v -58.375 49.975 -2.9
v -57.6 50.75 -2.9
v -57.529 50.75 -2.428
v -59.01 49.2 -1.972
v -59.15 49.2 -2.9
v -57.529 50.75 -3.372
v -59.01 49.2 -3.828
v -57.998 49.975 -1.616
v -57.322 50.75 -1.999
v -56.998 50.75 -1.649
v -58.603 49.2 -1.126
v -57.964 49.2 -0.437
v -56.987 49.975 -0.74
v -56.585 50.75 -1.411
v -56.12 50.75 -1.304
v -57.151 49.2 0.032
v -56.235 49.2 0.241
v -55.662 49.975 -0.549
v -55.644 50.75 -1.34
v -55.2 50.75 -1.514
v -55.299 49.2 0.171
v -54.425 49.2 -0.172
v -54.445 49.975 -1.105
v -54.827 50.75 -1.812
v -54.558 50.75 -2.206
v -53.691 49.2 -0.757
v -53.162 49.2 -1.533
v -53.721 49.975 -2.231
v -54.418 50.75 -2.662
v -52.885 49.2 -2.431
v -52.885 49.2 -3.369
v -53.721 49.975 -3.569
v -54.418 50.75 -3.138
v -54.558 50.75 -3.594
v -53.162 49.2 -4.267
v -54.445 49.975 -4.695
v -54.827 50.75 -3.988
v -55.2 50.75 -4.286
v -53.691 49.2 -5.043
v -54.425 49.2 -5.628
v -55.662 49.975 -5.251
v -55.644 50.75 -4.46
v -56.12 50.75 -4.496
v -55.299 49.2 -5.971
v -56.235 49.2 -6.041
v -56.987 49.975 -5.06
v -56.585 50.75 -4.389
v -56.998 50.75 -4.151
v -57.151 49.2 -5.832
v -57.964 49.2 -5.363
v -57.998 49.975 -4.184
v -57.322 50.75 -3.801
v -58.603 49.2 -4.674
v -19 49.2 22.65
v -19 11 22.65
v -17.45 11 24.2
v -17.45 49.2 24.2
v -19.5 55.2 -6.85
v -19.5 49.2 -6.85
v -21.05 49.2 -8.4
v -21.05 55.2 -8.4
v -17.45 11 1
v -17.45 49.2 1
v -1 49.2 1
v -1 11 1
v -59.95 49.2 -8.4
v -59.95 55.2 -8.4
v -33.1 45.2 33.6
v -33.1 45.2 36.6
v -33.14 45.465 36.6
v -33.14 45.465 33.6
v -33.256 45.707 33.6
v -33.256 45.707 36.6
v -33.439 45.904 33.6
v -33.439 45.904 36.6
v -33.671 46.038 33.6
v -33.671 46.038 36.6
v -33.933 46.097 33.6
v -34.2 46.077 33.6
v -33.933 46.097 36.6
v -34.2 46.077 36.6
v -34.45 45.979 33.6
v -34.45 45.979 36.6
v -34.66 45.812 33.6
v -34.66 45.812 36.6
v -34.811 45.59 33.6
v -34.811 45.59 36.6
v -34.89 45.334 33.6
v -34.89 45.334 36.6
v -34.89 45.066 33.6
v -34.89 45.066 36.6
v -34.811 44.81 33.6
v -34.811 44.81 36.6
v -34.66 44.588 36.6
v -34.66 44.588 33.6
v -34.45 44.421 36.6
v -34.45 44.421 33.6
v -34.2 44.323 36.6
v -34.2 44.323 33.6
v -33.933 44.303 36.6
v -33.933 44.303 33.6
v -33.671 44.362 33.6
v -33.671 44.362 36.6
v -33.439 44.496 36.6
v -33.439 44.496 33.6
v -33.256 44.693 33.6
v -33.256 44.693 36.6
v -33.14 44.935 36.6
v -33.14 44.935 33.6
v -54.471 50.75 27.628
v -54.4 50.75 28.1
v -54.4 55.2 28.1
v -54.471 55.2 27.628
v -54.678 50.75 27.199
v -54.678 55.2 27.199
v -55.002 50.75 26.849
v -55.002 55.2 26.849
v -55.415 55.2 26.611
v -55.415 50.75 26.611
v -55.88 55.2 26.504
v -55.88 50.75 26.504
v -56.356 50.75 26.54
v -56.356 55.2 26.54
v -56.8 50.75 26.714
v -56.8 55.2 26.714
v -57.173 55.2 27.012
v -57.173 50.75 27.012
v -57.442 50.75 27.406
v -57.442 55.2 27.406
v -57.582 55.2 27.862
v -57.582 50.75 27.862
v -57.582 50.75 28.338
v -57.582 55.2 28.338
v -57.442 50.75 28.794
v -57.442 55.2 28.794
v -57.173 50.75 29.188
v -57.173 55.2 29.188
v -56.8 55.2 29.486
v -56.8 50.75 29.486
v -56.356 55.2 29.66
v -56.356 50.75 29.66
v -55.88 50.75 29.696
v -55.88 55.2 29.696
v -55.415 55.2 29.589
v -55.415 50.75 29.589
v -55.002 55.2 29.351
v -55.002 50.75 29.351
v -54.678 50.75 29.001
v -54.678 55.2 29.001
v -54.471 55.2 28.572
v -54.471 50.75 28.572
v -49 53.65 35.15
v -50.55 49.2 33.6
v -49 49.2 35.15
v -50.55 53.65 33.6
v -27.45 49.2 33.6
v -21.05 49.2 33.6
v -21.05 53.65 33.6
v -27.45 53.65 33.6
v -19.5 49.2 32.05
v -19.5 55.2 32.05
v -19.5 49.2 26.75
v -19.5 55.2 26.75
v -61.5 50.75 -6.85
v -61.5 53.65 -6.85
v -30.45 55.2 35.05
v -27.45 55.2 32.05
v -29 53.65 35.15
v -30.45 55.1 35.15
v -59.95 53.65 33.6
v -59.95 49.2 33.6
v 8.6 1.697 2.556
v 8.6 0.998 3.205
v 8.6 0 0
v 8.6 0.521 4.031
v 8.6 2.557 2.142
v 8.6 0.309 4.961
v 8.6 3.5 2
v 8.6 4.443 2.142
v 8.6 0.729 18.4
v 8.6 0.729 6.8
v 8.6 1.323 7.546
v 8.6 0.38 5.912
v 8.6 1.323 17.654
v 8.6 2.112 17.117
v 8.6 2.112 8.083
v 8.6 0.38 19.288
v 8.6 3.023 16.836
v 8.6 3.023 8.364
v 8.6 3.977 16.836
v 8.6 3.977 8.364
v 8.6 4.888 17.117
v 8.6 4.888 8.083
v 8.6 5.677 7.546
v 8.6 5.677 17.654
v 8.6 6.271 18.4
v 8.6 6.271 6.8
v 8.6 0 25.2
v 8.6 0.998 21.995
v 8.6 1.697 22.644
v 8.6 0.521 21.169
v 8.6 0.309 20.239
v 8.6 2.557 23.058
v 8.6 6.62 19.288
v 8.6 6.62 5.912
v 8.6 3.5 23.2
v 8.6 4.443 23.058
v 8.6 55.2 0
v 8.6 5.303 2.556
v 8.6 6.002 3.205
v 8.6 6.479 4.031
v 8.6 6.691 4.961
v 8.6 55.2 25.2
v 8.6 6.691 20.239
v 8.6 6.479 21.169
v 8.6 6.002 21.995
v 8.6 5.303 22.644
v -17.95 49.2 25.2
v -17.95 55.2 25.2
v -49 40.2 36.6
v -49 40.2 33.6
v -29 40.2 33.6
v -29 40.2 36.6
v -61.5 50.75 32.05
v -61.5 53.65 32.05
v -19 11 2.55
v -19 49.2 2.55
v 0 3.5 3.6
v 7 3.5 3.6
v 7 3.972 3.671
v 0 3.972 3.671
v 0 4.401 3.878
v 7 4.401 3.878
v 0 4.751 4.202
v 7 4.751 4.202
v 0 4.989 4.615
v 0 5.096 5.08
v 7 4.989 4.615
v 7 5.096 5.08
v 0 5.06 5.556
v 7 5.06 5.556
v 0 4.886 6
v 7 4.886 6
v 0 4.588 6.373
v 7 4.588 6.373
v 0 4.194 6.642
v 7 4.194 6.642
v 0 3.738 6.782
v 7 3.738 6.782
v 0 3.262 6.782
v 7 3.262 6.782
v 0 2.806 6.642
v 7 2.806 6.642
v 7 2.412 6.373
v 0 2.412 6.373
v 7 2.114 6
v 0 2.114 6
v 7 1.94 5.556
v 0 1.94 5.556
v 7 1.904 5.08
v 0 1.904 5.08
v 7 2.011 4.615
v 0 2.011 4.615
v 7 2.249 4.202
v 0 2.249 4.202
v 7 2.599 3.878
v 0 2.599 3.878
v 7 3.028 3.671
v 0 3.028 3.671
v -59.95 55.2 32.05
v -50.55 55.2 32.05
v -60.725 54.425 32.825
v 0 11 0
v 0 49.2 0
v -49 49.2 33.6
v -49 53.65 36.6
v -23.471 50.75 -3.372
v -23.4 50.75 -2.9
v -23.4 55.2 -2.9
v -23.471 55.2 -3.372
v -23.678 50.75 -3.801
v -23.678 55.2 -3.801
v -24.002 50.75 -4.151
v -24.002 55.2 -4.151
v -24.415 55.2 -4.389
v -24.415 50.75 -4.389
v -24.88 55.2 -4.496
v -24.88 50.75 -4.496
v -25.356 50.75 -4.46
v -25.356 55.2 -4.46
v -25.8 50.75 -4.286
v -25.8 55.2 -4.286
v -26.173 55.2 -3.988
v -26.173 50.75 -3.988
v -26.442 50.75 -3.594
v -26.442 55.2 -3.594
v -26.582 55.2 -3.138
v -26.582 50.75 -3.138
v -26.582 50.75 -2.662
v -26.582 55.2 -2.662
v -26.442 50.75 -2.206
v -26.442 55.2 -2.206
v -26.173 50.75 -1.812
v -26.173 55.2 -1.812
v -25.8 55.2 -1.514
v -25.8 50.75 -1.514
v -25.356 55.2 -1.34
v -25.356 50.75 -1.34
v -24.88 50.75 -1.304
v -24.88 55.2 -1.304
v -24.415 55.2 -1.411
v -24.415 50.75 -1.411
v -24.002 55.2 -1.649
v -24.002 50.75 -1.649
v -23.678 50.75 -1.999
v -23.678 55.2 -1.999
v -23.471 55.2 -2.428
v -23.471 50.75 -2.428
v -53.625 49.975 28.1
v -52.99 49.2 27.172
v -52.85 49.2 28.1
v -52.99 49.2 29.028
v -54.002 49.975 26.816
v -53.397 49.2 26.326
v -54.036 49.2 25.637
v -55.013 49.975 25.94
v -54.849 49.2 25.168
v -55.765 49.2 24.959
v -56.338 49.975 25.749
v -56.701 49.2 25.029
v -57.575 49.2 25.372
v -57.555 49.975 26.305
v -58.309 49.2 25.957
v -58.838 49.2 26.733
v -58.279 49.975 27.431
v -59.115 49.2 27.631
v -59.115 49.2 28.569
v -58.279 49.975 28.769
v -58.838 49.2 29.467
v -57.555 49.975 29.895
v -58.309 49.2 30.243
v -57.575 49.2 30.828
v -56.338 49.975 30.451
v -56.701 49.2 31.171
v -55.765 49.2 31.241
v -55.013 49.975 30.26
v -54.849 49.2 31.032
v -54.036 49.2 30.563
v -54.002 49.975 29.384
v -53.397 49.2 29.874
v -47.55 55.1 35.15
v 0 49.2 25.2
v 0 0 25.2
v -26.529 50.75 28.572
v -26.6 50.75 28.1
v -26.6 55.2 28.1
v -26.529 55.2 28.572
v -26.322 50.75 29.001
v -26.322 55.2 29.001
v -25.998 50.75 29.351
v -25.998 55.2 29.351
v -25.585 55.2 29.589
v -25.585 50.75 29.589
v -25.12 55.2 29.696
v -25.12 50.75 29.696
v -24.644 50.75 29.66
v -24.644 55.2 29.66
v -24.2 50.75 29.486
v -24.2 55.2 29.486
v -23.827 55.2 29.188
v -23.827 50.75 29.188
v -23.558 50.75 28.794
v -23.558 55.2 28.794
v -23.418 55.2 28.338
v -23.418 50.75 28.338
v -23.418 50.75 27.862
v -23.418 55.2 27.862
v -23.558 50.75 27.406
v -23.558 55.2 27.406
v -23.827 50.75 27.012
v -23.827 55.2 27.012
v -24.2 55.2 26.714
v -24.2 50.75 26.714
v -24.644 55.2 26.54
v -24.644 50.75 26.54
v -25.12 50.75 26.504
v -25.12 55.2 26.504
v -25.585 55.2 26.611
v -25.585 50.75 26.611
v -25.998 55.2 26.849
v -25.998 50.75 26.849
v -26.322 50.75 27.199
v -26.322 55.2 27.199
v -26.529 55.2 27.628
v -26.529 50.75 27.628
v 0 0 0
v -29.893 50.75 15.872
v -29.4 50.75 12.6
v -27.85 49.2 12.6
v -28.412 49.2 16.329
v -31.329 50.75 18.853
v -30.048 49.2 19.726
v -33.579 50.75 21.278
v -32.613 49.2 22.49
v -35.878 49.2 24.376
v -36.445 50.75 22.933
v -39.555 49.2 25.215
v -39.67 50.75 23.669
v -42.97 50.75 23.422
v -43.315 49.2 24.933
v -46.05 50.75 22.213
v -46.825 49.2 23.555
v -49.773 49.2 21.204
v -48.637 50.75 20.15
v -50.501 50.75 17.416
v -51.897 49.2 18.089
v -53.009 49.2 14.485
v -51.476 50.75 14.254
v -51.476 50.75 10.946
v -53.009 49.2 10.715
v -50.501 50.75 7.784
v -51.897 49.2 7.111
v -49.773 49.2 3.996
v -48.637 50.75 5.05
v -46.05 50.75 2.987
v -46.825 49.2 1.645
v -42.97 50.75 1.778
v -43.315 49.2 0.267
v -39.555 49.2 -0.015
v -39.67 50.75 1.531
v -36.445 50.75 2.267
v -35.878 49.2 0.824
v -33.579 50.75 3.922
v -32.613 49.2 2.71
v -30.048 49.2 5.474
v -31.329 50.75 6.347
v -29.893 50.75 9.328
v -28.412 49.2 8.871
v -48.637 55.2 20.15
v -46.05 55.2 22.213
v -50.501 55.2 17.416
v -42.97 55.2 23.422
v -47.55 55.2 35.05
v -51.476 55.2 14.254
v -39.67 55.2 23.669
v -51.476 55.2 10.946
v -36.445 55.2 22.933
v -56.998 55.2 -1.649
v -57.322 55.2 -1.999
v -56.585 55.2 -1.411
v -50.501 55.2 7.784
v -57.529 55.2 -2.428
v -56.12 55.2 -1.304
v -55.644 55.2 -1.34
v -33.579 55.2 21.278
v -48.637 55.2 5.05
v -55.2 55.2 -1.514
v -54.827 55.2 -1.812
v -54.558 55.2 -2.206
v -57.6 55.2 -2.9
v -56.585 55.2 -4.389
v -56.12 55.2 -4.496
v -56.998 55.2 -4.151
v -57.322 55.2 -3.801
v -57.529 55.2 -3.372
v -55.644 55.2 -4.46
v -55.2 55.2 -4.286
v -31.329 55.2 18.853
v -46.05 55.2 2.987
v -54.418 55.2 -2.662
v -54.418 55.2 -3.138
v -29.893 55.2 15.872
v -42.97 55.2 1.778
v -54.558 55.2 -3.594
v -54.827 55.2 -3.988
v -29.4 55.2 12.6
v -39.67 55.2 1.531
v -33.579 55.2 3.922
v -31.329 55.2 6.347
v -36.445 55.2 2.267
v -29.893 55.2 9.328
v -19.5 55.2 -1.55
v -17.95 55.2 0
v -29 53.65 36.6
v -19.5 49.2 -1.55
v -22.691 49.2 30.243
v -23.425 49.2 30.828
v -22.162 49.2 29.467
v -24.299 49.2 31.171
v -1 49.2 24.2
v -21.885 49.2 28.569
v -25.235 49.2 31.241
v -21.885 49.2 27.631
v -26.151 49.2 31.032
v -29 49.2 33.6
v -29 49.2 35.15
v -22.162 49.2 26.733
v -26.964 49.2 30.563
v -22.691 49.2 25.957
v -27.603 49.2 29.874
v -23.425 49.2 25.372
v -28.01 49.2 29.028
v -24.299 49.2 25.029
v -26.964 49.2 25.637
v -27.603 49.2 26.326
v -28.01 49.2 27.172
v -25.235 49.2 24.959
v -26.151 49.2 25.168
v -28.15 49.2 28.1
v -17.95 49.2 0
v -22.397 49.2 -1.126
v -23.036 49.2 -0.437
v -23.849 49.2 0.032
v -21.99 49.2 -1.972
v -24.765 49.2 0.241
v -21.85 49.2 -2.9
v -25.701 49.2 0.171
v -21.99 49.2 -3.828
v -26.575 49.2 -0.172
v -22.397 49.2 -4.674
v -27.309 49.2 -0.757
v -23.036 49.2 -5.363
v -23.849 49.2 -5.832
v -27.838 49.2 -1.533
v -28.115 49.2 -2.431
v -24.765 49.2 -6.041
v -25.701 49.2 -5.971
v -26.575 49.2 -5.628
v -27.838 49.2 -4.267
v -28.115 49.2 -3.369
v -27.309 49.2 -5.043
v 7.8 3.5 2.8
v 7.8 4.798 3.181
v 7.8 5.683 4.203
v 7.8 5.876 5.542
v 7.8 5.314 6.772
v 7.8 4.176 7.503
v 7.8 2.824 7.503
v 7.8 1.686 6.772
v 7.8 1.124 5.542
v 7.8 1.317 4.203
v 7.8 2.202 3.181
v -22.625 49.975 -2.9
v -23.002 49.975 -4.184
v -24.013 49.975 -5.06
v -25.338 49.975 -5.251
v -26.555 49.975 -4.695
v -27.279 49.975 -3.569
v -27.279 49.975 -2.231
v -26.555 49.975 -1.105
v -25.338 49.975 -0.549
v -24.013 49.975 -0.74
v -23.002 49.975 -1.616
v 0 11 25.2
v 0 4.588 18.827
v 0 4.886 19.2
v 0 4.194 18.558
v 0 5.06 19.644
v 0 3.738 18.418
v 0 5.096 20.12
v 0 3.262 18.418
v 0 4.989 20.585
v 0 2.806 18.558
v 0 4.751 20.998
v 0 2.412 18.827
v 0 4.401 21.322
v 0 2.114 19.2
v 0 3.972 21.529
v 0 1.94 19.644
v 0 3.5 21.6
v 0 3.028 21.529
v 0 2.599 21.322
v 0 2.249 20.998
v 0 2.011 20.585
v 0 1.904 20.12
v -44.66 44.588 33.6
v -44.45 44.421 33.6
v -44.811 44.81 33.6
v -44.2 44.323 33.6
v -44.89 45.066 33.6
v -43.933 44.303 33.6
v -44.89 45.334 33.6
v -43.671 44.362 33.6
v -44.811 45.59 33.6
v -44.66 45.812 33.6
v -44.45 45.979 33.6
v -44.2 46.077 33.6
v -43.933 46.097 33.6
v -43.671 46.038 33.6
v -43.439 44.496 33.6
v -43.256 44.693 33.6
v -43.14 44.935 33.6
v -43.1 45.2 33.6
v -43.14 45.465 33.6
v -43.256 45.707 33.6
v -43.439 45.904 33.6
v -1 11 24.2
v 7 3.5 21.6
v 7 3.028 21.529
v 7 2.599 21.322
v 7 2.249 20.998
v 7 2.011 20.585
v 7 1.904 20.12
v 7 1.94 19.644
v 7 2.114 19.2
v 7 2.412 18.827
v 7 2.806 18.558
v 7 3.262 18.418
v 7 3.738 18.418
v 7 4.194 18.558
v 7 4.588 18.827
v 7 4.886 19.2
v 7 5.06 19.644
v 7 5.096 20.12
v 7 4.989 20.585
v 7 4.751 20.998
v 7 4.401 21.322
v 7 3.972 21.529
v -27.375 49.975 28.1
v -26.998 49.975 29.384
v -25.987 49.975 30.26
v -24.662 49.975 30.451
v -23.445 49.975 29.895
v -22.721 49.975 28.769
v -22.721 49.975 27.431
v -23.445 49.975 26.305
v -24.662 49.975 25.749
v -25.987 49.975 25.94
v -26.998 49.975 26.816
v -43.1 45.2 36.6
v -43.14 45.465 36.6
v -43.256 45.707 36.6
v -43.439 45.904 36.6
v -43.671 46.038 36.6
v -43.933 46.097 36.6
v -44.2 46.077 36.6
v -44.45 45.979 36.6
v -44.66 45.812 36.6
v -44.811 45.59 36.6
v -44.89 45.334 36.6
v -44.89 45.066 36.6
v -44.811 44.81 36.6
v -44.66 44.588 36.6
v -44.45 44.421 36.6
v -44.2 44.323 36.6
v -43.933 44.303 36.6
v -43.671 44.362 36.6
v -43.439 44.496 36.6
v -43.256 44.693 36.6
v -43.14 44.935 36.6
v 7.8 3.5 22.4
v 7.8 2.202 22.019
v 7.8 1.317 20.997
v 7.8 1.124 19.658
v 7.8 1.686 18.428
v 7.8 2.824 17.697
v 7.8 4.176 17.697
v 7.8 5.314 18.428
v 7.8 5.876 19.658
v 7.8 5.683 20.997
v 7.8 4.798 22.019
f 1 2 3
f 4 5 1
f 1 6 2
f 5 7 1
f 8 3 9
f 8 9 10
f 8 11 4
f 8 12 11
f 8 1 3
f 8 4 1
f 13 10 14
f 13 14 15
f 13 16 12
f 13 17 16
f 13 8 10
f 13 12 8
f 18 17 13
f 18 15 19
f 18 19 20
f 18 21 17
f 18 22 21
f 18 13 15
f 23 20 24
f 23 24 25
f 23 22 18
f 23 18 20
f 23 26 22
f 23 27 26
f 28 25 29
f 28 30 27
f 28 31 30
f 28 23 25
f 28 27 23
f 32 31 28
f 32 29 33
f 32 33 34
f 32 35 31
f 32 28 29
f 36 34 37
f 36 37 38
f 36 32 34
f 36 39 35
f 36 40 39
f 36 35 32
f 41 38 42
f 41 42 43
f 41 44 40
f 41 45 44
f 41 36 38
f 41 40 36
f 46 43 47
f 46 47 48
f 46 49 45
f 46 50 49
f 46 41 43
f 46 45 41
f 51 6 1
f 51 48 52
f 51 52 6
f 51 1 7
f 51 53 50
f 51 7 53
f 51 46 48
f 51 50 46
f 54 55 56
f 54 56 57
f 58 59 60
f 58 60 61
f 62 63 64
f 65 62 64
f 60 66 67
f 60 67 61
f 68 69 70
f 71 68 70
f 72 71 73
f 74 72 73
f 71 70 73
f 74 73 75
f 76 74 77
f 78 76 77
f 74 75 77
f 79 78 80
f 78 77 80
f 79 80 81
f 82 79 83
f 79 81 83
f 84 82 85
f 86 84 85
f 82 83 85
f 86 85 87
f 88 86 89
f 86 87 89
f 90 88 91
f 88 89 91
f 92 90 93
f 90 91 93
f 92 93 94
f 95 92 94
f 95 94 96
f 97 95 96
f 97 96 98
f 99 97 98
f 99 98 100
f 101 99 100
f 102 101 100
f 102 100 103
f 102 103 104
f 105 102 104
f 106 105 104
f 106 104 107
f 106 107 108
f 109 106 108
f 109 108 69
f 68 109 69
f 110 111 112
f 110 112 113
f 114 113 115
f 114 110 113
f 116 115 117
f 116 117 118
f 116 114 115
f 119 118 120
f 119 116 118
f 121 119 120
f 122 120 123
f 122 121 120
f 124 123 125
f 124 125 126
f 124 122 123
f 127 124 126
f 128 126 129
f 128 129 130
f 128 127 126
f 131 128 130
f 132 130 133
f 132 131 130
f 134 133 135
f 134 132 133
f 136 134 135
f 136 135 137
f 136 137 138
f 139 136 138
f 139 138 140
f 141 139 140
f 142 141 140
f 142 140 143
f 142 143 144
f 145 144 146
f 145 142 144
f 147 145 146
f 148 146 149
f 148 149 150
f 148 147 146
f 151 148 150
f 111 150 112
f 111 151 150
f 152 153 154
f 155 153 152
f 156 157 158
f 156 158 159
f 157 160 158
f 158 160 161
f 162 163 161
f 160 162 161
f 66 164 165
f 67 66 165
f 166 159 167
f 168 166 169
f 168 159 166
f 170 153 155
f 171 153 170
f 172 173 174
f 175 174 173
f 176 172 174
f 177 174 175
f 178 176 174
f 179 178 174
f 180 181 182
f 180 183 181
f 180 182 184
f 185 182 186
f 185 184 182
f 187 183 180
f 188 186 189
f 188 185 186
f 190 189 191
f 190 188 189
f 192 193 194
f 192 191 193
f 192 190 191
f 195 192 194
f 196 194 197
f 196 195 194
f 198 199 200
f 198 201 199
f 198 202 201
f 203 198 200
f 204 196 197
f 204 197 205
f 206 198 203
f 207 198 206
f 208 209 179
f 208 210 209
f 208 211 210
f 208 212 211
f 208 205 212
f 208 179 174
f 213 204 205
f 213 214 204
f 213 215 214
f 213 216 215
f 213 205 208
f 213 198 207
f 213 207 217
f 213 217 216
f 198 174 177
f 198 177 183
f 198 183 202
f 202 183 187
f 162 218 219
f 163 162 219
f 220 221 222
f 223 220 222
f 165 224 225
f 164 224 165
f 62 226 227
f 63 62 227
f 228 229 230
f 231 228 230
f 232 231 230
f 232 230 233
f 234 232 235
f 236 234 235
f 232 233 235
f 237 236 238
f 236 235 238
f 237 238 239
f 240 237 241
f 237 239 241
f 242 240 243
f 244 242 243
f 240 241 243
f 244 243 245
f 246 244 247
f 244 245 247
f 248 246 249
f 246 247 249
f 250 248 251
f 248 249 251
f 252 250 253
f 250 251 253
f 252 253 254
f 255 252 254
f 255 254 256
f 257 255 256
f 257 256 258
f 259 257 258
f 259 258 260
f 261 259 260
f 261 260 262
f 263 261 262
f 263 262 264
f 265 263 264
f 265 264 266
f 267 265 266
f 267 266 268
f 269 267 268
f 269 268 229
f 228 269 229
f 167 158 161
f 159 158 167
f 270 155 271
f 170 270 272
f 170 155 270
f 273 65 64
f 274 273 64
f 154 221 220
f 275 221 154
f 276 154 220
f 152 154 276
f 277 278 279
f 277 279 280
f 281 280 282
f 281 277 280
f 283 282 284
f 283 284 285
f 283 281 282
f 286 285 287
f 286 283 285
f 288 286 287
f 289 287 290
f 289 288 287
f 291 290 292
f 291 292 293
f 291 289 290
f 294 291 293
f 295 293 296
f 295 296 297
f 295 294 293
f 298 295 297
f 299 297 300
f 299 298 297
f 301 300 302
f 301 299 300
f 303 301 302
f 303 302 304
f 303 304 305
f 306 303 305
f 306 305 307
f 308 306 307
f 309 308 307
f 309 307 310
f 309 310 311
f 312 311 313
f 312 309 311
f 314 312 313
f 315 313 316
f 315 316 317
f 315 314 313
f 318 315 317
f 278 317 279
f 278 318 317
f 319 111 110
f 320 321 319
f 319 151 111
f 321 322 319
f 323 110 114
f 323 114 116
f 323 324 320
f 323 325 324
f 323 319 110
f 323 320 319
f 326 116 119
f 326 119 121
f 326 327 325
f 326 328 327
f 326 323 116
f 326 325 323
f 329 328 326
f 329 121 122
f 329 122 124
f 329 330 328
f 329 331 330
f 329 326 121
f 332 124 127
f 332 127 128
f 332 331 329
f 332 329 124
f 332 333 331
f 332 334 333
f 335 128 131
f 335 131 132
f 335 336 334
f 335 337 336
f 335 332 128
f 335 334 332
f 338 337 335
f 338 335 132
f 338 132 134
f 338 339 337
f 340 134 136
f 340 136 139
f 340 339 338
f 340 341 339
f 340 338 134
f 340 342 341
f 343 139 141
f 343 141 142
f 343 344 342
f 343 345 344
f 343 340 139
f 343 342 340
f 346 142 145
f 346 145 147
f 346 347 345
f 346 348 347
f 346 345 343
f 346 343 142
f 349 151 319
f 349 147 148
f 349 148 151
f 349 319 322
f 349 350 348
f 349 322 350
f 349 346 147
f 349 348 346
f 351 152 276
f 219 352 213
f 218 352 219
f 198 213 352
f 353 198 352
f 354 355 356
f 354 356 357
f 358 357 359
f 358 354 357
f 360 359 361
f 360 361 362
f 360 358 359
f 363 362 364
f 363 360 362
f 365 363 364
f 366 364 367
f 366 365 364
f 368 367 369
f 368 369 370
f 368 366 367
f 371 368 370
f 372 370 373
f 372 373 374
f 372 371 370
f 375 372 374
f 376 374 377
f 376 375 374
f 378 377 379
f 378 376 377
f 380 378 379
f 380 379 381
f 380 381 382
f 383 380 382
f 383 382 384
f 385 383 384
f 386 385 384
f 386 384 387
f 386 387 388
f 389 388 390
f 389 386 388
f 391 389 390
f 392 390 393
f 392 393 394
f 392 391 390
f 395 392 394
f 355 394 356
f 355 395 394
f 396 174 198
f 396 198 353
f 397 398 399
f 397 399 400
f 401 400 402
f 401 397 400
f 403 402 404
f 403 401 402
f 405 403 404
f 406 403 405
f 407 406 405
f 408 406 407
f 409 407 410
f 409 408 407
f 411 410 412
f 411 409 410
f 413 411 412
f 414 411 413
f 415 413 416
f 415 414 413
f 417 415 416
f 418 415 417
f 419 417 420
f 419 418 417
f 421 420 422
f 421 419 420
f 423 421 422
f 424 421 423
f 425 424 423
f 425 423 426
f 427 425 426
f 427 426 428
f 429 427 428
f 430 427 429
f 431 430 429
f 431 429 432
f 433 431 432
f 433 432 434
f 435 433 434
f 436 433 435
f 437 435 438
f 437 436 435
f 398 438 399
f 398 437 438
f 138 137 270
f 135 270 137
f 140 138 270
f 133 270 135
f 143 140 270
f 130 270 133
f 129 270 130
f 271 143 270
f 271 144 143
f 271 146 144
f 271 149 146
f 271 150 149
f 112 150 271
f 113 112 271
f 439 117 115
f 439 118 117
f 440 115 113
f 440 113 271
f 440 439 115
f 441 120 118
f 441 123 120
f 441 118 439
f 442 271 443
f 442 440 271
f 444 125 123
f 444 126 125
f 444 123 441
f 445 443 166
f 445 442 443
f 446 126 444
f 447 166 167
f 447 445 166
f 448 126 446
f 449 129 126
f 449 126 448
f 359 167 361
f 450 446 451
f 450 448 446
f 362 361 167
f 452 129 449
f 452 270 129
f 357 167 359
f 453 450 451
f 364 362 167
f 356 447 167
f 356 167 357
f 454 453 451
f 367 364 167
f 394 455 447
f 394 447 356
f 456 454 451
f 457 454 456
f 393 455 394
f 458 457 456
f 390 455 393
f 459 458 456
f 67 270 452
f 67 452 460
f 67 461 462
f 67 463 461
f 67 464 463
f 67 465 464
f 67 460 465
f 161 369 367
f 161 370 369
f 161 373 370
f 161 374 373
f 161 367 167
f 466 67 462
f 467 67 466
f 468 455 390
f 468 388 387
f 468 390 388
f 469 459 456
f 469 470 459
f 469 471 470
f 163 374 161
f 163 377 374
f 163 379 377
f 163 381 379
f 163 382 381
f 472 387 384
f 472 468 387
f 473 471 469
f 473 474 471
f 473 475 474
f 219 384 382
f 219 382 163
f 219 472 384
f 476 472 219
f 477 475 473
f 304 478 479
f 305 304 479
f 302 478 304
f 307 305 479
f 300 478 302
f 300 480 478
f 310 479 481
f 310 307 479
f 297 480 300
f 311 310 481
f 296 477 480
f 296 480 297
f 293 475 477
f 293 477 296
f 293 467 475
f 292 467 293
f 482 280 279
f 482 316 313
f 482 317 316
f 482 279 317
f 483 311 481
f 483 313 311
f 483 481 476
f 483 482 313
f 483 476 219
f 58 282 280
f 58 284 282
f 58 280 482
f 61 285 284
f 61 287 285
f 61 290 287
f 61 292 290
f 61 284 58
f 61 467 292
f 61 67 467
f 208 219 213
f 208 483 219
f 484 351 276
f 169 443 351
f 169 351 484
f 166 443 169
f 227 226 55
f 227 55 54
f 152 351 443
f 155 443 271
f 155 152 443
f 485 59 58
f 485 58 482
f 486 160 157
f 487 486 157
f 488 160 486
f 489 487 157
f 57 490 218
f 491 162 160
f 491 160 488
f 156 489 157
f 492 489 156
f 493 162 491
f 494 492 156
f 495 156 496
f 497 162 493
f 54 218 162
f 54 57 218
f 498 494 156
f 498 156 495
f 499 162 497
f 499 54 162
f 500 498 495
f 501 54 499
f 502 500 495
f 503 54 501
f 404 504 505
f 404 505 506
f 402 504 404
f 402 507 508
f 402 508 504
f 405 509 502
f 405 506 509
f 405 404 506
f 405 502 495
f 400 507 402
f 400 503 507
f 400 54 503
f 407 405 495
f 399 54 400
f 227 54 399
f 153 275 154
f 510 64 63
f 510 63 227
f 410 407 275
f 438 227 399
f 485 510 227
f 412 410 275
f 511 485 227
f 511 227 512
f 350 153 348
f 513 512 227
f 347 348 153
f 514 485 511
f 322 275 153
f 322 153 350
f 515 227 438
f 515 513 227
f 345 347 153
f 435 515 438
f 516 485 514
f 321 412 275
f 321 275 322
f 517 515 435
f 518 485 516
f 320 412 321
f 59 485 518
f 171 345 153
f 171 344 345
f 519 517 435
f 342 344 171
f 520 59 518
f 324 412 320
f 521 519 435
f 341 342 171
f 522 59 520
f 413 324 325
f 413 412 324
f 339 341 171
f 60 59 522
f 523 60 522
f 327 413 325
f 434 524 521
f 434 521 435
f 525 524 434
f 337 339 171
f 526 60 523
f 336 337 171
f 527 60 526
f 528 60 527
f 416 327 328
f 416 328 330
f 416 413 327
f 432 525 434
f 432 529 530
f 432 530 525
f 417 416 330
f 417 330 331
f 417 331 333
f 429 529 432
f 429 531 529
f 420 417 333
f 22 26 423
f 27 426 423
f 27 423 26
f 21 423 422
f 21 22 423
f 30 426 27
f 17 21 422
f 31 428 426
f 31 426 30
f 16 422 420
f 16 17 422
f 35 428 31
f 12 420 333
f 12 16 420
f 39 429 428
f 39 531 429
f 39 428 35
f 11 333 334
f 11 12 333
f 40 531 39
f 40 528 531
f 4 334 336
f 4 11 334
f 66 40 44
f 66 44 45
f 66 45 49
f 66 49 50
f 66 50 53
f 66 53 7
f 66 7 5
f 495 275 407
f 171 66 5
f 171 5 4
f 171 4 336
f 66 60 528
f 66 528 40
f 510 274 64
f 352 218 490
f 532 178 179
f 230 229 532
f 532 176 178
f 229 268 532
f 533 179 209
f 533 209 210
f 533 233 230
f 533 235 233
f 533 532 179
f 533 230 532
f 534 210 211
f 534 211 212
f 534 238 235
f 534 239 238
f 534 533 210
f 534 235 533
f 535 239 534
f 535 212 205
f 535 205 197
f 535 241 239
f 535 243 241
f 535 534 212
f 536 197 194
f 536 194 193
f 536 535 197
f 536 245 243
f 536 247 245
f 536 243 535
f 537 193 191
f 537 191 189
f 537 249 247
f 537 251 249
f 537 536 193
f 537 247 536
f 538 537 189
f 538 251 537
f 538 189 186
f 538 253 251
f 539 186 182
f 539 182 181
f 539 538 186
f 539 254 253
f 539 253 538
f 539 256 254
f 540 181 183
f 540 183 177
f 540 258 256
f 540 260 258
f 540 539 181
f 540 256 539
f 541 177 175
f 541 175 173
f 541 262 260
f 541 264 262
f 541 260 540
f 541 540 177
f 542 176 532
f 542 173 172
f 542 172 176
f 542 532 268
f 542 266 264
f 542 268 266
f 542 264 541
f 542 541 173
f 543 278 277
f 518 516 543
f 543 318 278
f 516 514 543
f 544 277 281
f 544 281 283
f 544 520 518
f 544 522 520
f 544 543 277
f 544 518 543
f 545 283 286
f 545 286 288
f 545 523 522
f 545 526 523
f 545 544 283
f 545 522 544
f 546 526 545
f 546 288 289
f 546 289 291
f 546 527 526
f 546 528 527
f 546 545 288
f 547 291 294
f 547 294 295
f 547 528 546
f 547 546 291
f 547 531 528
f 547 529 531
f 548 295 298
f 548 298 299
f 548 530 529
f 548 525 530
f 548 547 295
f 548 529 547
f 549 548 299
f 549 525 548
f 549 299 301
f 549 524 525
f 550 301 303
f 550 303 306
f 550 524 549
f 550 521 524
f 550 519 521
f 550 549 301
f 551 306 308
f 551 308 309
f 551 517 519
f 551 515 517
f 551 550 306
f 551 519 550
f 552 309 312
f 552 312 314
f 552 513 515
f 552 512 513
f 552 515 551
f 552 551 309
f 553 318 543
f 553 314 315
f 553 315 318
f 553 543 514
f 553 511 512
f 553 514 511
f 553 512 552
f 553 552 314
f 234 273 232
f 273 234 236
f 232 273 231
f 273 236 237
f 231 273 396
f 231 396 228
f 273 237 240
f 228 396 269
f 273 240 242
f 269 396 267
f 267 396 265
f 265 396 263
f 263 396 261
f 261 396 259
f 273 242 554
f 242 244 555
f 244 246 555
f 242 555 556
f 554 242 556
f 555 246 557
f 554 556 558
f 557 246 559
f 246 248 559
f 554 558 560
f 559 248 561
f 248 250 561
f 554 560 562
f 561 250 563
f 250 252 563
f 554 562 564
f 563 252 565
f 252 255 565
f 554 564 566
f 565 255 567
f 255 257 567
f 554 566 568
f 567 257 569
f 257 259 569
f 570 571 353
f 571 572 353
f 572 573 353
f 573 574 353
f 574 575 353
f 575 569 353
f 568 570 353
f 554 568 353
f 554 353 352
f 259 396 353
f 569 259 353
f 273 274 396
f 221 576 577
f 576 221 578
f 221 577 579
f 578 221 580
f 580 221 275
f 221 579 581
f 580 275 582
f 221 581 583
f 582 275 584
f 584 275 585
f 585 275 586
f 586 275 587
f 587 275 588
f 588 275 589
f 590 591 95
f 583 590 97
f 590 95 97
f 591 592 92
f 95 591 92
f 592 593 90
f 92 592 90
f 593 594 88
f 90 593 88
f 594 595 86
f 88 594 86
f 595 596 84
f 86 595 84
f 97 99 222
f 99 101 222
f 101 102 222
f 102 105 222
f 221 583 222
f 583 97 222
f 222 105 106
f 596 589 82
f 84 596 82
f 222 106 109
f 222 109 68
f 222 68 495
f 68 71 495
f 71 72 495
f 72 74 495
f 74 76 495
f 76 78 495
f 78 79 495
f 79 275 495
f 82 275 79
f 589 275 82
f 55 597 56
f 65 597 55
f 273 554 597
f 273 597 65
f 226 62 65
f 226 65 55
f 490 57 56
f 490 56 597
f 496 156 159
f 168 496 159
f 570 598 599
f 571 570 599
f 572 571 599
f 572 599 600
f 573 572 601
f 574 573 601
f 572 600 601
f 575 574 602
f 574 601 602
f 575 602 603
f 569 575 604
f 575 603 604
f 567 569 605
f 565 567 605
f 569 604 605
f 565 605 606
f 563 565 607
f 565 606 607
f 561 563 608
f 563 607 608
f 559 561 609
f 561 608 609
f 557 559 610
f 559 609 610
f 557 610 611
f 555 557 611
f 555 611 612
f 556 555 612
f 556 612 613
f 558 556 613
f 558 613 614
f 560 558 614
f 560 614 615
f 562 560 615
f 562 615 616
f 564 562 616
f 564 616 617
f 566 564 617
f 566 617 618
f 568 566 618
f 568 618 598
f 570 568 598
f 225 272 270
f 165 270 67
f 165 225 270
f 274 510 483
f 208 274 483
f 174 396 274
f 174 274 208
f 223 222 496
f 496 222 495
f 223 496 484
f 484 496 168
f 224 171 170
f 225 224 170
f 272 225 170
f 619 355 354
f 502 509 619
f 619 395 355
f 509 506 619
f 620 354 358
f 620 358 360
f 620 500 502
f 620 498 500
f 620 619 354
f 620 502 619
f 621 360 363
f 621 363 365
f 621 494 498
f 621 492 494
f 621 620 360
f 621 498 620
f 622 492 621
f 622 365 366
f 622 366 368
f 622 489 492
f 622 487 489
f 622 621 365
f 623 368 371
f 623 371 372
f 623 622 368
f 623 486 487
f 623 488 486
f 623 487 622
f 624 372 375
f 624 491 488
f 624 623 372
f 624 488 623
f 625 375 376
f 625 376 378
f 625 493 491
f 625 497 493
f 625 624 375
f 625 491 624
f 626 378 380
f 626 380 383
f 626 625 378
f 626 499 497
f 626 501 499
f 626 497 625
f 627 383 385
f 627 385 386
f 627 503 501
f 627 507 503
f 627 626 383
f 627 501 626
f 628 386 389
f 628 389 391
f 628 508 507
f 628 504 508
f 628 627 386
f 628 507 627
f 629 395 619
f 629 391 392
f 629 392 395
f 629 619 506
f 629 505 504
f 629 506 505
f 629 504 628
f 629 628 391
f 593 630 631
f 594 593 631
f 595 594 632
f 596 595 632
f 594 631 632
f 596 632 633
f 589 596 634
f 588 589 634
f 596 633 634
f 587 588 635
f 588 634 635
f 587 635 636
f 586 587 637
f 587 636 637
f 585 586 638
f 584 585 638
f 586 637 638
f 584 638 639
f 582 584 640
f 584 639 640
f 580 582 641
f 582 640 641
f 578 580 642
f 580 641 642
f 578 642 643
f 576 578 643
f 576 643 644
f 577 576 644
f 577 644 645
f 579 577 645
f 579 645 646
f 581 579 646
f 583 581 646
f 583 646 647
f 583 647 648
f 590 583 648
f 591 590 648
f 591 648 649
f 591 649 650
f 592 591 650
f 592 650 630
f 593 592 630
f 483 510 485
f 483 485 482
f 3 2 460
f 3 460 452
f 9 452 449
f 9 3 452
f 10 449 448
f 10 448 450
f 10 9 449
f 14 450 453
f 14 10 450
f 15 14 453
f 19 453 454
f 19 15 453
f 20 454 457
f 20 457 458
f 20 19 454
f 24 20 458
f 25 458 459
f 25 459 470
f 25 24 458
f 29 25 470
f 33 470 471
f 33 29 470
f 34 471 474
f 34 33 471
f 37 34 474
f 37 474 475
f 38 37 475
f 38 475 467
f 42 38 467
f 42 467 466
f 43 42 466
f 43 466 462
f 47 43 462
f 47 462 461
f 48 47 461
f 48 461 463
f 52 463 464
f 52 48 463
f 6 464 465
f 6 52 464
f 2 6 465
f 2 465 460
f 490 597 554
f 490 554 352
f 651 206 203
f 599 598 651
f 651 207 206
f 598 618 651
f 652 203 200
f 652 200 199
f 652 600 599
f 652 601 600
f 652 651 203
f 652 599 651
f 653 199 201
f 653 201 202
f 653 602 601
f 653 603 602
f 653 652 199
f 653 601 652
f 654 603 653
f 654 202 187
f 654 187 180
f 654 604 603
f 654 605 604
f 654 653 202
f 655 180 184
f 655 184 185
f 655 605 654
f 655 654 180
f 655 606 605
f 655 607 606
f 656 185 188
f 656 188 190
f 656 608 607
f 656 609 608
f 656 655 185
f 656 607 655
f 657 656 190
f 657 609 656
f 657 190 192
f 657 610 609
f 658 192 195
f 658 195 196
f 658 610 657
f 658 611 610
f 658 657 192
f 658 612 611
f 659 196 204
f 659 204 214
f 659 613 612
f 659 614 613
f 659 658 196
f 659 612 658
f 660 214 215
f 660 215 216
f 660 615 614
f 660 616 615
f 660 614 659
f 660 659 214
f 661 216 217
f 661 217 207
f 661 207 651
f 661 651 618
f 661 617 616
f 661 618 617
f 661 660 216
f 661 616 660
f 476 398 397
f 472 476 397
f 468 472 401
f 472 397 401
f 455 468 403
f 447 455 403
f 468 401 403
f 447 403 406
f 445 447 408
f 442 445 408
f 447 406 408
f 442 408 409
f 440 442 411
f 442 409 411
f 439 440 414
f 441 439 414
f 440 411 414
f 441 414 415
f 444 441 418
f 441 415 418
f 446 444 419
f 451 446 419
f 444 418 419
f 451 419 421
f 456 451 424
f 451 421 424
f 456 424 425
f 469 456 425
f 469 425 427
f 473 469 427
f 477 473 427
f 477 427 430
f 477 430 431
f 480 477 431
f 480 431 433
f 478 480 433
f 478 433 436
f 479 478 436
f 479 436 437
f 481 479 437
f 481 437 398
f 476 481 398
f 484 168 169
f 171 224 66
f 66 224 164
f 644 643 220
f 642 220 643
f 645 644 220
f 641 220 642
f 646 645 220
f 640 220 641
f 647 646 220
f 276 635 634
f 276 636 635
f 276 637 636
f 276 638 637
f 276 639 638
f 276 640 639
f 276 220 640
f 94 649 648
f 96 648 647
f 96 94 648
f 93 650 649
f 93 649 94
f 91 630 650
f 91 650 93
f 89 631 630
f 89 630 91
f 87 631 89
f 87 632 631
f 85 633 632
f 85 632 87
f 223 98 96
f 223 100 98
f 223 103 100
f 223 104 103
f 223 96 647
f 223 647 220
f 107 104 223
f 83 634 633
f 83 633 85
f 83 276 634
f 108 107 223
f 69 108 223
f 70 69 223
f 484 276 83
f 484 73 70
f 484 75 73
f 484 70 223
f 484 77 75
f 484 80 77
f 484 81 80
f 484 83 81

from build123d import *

# Parameters (mm, degrees)
BOSS_EXTRUDE1_DEPTH = 25.2
SKETCH2_R           = 1.6
BOSS_EXTRUDE2_DEPTH = 6
SKETCH3_W           = 19
SKETCH3_H           = 1
CUT_EXTRUDE1_DEPTH  = 38.2
CHAMFER2_SIZE       = 1.55
SKETCH4_R           = 11.1
CUT_EXTRUDE2_DEPTH  = 86.626222619
CHAMFER3_SIZE       = 1.55
CHAMFER4_SIZE       = 1
SKETCH5_R           = 1.6
CUT_EXTRUDE3_DEPTH  = 96.48869043
SKETCH6_W           = 20
SKETCH6_H           = 15
BOSS_EXTRUDE3_DEPTH = 3
SKETCH7_R           = 0.9
CUT_EXTRUDE4_DEPTH  = 95.097236941
CHAMFER7_SIZE       = 1.55
CHAMFER8_SIZE       = 1.55
SKETCH8_W           = 0.2
SKETCH8_H           = 55.2
CUT_EXTRUDE5_DEPTH  = 90.209024207
CHAMFER9_SIZE       = 1.6


with BuildPart() as part:
    # Sketch1 → Boss-Extrude1 (new body)
    with BuildSketch(Plane.XY):
        Polygon((0, 0), (0, 11), (-19, 11), (-19, 49.2), (8.8, 49.2), (8.8, 0), align=None)
    extrude(amount=BOSS_EXTRUDE1_DEPTH)

    # Sketch2 → Boss-Extrude2 (add)
    with BuildSketch(Plane(origin=(0, 49.2, 0), x_dir=(1, 0, 0), z_dir=(0, 1, 0))):
        Polygon((-61.5, 8.4), (-19.5, 8.4), (-19.5, 0), (8.8, 0), (8.8, -25.2), (-19.5, -25.2), (-19.5, -33.6), (-61.5, -33.6), align=None)
        with Locations(Location((-56, 2.9, 0), (0, 0, 180))):
            Circle(SKETCH2_R, mode=Mode.SUBTRACT)
        with Locations((-56, -28.1)):
            Circle(SKETCH2_R, mode=Mode.SUBTRACT)
        with Locations(Location((-25, -28.1, 0), (0, 0, 180))):
            Circle(SKETCH2_R, mode=Mode.SUBTRACT)
        with Locations((-25, 2.9)):
            Circle(SKETCH2_R, mode=Mode.SUBTRACT)
    extrude(amount=BOSS_EXTRUDE2_DEPTH)

    # Sketch3 → Cut-Extrude1 (cut)
    with BuildSketch(Plane.XZ.offset(-11)):
        with Locations((-9.5, 24.7)):
            Rectangle(SKETCH3_W, SKETCH3_H)
        with Locations((-9.5, 0.5)):
            Rectangle(SKETCH3_W, SKETCH3_H)
    extrude(amount=-CUT_EXTRUDE1_DEPTH, mode=Mode.SUBTRACT)

    # Chamfer2
    chamfer2_edges = [part.edges().sort_by_distance(p)[0] for p in [
        (-54.4, 49.2, -2.9),
        (-57.6, 49.2, 28.1),
        (-23.4, 49.2, 28.1),
        (-26.6, 49.2, -2.9),
    ]]
    chamfer(chamfer2_edges, length=CHAMFER2_SIZE)

    # Sketch4 → Cut-Extrude2 (cut, through all)
    with BuildSketch(Plane.XZ.offset(-49.2)):
        with Locations((-40.5, 12.6)):
            Circle(SKETCH4_R)
    extrude(amount=-CUT_EXTRUDE2_DEPTH, mode=Mode.SUBTRACT)

    # Chamfer3
    chamfer3_edges = [part.edges().sort_by_distance(p)[0] for p in [
        (-61.5, 55.2, 12.6),
        (-19.5, 52.2, 0),
        (-19.5, 52.2, -8.4),
        (-61.5, 49.2, 12.6),
        (-61.5, 52.2, -8.4),
        (-61.5, 52.2, 33.6),
        (-19.5, 52.2, 33.6),
        (-19.5, 52.2, 25.2),
        (-19, 30.1, 24.2),
        (-19, 30.1, 1),
        (-51.6, 49.2, 12.6),
    ]]
    chamfer(chamfer3_edges, length=CHAMFER3_SIZE)

    # Chamfer4
    chamfer4_edges = [part.edges().sort_by_distance(p)[0] for p in [
        (0, 30.1, 24.2),
        (0, 30.1, 1),
    ]]
    chamfer(chamfer4_edges, length=CHAMFER4_SIZE - 0.0001)  # a hair under: the kernel refuses the full size

    # Sketch5 → Cut-Extrude3 (cut, through all)
    with BuildSketch(Plane(origin=(8.8, 0, 0), x_dir=(0, 0, -1), z_dir=(1, 0, 0))):
        with Locations((-5.2, 3.5)):
            Circle(SKETCH5_R)
        with Locations(Location((-20, 3.5, 0), (0, 0, 180))):
            Circle(SKETCH5_R)
    extrude(amount=-CUT_EXTRUDE3_DEPTH, mode=Mode.SUBTRACT)

    # Sketch6 → Boss-Extrude3 (add)
    with BuildSketch(Plane.XY.offset(33.6)):
        with Locations((-39, 47.7)):
            Rectangle(SKETCH6_W, SKETCH6_H)
    extrude(amount=BOSS_EXTRUDE3_DEPTH)

    # Sketch7 → Cut-Extrude4 (cut, through all)
    with BuildSketch(Plane.XY.offset(36.6)):
        with Locations((-34, 45.2)):
            Circle(SKETCH7_R)
        with Locations((-44, 45.2)):
            Circle(SKETCH7_R)
    extrude(amount=-CUT_EXTRUDE4_DEPTH, mode=Mode.SUBTRACT)

    # Chamfer7
    chamfer7_edges = [part.edges().sort_by_distance(p)[0] for p in [
        (-29, 52.2, 33.6),
        (-25.025, 55.2, 33.6),
        (-29, 55.2, 35.1),
        (-49, 52.2, 33.6),
        (-49, 55.2, 35.1),
        (-54.475, 55.2, 33.6),
    ]]
    chamfer(chamfer7_edges, length=CHAMFER7_SIZE)

    # Chamfer8
    chamfer8_edges = [part.edges().sort_by_distance(p)[0] for p in [
        (-39, 55.2, 36.6),
    ]]
    chamfer(chamfer8_edges, length=CHAMFER8_SIZE)

    # Sketch8 → Cut-Extrude5 (cut, through all)
    with BuildSketch(Plane.XY.offset(25.2)):
        with Locations((8.7, 27.6)):
            Rectangle(SKETCH8_W, SKETCH8_H)
    extrude(amount=-CUT_EXTRUDE5_DEPTH, mode=Mode.SUBTRACT)

    # Chamfer9
    chamfer9_edges = [part.edges().sort_by_distance(p)[0] for p in [
        (8.6, 3.5, 6.8),
        (8.6, 3.5, 18.4),
    ]]
    chamfer(chamfer9_edges, length=CHAMFER9_SIZE)


solid = part.part
